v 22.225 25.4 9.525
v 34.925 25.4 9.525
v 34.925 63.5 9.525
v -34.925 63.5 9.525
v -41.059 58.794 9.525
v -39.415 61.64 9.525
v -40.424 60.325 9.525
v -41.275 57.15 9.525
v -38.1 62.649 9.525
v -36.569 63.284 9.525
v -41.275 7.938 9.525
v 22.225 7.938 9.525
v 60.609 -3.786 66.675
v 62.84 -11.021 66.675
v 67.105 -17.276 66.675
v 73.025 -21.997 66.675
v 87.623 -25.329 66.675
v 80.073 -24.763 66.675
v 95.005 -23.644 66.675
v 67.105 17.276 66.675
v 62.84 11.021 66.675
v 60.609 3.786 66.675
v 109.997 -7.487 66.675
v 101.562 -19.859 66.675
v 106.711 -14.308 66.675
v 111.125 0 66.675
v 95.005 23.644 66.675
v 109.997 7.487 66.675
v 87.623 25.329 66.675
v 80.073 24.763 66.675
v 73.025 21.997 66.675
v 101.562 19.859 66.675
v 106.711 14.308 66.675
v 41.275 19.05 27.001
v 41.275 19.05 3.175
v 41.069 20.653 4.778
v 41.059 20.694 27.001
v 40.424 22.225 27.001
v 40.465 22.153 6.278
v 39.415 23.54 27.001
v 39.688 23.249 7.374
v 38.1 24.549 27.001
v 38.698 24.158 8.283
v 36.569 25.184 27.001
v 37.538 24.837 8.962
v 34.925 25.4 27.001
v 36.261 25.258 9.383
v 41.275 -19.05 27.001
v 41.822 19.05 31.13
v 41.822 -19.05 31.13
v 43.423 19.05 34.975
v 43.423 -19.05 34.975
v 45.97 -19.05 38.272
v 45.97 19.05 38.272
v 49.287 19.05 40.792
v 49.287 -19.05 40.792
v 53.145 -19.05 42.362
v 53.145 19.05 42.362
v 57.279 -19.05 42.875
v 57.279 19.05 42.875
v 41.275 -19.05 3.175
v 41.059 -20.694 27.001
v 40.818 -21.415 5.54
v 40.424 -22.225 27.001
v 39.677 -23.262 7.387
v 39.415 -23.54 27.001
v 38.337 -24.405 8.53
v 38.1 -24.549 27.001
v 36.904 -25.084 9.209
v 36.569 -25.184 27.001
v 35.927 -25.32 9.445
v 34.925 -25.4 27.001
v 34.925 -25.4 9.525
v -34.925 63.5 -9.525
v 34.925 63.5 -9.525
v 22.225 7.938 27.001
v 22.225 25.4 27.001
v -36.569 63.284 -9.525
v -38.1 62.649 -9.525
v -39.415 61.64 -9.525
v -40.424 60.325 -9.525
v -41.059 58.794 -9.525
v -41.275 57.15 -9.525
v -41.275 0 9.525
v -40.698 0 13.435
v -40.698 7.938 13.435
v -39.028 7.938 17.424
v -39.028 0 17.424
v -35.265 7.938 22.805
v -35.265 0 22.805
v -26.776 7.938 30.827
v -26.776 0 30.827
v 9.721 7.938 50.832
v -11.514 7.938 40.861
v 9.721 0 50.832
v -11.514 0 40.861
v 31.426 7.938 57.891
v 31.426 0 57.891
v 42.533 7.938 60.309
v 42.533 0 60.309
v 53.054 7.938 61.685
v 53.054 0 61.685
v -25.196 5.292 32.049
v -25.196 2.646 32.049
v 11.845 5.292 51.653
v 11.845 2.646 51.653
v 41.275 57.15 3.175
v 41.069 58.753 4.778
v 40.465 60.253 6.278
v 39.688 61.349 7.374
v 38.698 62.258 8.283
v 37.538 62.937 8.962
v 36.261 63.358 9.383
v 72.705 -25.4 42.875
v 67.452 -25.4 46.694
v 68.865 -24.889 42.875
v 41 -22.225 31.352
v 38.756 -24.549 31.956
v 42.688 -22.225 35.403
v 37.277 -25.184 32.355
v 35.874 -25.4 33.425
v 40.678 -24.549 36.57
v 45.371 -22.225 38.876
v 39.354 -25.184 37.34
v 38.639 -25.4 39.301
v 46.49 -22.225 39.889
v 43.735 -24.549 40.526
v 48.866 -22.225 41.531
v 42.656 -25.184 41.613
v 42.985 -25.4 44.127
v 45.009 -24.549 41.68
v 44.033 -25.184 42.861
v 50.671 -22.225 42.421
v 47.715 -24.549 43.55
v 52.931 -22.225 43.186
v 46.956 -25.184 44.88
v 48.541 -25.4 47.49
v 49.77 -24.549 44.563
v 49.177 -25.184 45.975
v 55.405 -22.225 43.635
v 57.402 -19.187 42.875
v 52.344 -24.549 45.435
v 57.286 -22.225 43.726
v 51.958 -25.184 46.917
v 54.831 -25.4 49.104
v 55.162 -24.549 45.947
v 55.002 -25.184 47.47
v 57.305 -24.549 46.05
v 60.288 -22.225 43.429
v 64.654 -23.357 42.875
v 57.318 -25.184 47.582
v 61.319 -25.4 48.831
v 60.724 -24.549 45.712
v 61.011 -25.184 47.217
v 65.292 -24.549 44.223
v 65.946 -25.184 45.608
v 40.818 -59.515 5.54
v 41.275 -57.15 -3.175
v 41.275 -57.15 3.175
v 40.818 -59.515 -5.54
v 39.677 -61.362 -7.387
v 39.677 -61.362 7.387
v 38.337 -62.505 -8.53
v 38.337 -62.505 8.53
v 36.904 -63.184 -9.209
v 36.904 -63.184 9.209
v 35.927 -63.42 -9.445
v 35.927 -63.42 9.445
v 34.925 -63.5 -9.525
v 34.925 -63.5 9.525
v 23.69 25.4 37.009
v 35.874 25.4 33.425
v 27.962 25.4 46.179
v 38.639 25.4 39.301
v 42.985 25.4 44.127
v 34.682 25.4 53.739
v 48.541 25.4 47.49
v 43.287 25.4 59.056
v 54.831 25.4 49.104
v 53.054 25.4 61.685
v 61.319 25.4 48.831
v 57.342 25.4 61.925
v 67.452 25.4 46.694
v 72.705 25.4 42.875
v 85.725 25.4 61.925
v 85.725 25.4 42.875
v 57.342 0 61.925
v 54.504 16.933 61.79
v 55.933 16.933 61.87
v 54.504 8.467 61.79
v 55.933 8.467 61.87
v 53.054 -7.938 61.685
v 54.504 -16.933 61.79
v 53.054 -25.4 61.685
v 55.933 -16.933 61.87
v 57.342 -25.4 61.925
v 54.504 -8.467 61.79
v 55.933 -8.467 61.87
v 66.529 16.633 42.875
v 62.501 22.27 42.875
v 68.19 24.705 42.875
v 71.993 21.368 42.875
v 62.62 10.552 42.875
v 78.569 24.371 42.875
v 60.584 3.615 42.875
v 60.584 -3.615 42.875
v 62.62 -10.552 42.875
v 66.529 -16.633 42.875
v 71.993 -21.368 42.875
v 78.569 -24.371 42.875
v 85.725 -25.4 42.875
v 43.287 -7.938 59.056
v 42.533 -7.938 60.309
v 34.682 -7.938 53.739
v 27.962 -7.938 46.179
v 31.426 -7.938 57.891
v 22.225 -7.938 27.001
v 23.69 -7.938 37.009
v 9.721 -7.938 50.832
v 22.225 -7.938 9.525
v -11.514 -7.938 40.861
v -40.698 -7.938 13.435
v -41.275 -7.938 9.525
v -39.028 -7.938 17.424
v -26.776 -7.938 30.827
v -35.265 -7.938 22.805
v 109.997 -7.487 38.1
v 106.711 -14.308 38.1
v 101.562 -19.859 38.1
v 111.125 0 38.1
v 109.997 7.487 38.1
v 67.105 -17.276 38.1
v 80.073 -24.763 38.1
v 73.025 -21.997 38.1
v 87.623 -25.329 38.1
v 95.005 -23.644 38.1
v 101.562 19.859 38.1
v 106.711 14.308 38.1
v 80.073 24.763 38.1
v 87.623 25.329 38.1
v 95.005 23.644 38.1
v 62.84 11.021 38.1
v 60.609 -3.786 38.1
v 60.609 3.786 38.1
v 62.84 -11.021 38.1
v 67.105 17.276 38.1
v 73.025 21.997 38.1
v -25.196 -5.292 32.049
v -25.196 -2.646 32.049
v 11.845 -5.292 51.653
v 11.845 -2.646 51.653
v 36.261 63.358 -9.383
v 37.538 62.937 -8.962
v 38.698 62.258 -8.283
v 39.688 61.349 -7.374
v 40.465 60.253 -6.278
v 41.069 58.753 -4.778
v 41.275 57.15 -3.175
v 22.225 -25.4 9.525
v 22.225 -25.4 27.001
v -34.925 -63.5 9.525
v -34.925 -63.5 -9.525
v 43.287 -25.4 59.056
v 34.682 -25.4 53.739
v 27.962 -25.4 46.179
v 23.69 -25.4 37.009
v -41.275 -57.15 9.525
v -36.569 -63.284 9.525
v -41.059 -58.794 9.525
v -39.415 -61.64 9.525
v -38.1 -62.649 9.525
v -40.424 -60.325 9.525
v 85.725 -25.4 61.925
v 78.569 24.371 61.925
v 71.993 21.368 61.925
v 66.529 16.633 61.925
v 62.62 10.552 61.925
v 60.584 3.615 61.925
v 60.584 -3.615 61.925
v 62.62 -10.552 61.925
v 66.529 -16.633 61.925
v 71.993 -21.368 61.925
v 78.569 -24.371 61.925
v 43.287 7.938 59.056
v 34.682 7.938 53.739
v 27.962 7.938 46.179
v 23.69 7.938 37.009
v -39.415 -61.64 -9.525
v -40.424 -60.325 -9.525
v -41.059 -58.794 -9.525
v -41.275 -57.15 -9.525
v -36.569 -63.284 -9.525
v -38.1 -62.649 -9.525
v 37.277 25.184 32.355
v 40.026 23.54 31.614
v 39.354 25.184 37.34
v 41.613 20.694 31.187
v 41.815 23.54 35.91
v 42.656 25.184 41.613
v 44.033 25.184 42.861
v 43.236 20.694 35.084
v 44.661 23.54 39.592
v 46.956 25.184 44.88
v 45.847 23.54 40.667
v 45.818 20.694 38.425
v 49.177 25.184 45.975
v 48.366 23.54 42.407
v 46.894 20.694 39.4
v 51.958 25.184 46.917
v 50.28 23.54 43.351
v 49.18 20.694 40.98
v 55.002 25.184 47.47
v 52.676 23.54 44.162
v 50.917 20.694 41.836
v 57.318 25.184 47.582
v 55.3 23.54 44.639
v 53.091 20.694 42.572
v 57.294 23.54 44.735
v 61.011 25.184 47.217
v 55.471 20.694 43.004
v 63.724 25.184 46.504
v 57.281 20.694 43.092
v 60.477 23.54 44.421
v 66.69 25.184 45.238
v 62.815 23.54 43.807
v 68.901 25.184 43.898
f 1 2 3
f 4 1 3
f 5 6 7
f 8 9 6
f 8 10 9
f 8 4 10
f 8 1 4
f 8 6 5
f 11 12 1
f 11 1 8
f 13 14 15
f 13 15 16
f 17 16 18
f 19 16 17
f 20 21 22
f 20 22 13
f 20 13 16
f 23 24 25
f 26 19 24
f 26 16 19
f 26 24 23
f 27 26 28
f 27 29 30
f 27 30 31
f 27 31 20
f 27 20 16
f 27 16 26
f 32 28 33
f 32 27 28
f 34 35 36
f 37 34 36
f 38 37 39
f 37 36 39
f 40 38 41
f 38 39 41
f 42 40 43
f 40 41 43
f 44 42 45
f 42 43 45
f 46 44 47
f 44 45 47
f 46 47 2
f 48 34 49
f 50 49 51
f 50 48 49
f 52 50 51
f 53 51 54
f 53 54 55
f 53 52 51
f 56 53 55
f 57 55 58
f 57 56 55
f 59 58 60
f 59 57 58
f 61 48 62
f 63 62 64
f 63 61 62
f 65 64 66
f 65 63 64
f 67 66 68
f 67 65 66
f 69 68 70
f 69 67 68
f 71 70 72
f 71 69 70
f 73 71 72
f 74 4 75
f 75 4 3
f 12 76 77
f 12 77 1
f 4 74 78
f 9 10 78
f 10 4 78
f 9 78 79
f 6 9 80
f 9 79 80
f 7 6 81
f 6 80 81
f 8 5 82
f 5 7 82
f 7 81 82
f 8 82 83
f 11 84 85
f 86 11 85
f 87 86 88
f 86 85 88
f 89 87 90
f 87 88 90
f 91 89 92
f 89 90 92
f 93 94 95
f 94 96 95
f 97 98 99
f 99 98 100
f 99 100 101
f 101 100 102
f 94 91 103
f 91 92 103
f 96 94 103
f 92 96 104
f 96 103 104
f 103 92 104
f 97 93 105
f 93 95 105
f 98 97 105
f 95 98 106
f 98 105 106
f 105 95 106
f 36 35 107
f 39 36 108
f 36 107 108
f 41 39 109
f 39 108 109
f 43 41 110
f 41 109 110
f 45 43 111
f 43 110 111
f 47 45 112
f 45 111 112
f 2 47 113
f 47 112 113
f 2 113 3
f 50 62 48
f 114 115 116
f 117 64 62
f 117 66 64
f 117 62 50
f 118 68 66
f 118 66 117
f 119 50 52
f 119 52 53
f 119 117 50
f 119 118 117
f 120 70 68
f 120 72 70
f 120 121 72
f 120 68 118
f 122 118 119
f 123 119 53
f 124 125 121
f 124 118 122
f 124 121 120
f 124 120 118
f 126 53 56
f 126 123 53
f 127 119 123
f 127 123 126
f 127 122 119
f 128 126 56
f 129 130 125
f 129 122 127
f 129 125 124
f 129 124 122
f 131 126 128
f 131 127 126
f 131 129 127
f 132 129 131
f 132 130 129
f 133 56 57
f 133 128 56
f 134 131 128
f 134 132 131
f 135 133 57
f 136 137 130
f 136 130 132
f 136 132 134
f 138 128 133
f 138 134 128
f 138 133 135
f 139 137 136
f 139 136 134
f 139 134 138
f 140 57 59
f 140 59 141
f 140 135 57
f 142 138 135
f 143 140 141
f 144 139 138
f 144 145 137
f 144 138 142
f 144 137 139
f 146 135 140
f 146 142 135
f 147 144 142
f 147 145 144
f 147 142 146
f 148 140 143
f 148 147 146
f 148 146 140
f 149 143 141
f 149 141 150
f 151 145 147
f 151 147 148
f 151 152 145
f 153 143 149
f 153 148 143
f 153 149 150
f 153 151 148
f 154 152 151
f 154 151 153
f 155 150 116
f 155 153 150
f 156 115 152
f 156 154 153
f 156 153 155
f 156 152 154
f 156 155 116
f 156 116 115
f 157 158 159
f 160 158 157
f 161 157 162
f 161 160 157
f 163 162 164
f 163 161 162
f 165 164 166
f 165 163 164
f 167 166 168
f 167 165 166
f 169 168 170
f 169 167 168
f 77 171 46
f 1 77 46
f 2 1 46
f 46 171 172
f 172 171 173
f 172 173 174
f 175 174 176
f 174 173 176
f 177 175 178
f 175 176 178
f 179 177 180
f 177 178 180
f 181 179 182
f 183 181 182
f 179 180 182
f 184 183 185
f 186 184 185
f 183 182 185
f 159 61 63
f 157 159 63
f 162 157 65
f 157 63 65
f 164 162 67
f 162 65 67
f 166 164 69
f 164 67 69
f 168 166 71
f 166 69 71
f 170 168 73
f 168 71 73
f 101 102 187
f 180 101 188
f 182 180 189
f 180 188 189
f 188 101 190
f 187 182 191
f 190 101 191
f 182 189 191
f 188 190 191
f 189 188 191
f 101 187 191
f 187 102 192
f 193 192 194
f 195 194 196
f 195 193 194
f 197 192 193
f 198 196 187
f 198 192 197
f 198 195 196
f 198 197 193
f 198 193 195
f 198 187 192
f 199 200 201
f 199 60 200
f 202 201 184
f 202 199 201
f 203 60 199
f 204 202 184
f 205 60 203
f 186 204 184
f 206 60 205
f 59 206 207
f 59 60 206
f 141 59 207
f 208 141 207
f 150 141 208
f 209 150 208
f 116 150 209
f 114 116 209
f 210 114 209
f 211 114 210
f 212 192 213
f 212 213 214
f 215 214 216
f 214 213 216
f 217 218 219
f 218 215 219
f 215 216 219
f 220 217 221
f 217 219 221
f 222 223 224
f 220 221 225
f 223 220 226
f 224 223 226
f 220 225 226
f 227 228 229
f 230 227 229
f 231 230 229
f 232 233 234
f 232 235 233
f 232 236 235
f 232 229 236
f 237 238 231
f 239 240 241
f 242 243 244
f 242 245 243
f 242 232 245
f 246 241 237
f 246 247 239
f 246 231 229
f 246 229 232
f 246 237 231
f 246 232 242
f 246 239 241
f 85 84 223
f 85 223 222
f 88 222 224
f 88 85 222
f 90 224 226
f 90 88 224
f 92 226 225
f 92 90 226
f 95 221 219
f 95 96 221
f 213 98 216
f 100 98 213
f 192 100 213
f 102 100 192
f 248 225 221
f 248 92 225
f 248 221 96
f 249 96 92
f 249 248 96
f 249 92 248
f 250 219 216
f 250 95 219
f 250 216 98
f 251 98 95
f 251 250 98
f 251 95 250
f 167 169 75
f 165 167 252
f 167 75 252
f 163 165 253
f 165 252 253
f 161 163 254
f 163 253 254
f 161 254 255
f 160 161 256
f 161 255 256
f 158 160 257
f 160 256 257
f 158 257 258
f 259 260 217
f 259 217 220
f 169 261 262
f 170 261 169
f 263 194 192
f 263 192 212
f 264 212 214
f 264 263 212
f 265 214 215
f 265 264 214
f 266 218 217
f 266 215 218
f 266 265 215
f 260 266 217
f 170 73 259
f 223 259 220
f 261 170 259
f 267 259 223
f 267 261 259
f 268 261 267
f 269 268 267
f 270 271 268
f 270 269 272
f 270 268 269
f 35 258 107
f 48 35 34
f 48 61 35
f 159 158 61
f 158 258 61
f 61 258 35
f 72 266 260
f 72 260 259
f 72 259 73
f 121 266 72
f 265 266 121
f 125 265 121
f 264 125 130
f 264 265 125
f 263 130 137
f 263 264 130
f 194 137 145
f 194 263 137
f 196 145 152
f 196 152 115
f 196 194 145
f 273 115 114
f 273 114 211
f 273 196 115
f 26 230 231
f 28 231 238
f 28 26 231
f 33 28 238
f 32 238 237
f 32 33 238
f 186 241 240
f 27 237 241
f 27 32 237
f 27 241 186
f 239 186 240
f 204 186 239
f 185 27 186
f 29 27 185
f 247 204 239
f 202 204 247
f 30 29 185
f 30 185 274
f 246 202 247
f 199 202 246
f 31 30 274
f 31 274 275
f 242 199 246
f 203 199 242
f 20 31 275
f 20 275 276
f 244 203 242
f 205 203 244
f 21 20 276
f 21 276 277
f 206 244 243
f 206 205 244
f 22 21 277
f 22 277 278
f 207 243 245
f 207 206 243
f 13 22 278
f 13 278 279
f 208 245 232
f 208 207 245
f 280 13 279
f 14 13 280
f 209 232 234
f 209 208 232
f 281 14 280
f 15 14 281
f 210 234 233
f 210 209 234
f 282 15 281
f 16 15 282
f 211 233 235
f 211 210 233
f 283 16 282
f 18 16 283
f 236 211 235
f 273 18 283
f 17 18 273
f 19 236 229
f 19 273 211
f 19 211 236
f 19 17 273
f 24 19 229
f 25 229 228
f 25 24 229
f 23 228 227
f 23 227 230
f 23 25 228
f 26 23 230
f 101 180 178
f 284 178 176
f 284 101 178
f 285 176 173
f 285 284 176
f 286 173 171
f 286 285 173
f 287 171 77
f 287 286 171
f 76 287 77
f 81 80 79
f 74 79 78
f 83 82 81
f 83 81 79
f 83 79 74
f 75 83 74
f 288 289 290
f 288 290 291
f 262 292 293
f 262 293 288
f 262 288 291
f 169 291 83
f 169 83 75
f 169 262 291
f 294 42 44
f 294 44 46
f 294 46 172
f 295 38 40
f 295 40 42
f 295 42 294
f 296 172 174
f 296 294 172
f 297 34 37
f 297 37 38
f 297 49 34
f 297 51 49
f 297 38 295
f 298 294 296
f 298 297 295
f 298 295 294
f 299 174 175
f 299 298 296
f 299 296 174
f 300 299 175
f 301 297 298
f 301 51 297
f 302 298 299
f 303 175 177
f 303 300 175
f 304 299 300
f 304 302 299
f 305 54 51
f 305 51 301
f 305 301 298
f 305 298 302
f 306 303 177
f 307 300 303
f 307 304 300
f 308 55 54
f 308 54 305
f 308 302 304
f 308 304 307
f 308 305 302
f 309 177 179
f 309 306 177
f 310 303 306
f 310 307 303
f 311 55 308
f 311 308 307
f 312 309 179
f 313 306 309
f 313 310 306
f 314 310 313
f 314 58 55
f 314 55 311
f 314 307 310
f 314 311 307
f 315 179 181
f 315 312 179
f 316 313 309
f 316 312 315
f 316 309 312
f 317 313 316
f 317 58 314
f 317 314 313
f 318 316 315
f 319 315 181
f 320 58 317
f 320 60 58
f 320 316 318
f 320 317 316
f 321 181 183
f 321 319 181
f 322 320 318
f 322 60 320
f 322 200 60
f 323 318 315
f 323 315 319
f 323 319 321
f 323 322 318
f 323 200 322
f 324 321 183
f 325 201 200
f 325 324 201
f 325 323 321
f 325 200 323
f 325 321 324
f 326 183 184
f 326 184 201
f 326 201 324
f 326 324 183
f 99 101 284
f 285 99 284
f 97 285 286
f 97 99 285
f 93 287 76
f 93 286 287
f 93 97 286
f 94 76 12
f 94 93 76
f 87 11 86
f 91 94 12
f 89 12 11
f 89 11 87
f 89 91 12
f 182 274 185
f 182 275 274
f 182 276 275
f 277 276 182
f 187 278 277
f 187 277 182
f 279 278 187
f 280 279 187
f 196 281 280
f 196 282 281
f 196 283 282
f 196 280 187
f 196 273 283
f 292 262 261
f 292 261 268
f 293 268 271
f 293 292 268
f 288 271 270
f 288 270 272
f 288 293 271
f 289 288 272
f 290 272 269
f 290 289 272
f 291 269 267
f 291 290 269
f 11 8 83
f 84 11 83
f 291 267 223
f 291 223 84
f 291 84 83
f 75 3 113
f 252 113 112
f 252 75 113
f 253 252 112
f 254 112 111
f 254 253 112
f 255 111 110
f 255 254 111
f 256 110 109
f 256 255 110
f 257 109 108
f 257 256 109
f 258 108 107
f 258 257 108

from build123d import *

# Parameters (mm, degrees)
F1_DEPTH     = 63.5
F0_W         = 25.4
F0_H         = 19.05
F2_DEPTH     = 25.4
F3_DEPTH     = 7.9375
F5_T1_DEPTH  = 50.8
F5_T3_DEPTH  = 158.75
F5_T5_DEPTH  = 53.975
F5_T7_DEPTH  = 17.4757259071
F5_T9_DEPTH  = 53.975
F5_T12_ANGLE = 147.7854112401
F5_T14_ANGLE = 147.7854112401
F5_T19_DEPTH = 53.975
F5_T23_DEPTH = 33.3507259071
F5_T30_DEPTH = 33.3507259071
F5_T34_DEPTH = 53.975


# Not quite as in the source:
# - a fillet or chamfer that OpenCascade refuses, or shapes differently, is made with other operations: its cross-section is extruded or revolved along the edge and cut away or added


with BuildPart() as f1:
    # F0 (on Front) → F1 (new body, symmetric)
    with BuildSketch(Plane.XZ):
        Polygon((-41.275, -9.525), (41.275, -9.525), (41.275, 9.525), (22.225, 9.525), (-41.275, 9.525), align=None)
    extrude(amount=F1_DEPTH, both=True)

    # F0 (on Front) → F2 (join, symmetric)
    with BuildSketch(Plane.XZ):
        with BuildLine():
            Line((22.225, 9.525), (41.275, 9.525))
            Line((41.275, 9.525), (41.275, 27.0007259071))
            ThreePointArc((41.275, 27.0007259071), (45.9704586348, 38.2716389076), (57.2792179355, 42.8752))
            Line((57.2792179355, 42.8752), (60.325, 42.8752))
            Line((60.325, 42.8752), (60.325, 61.9252))
            Line((60.325, 61.9252), (57.3416620374, 61.9252))
            add(Edge.make_bspline(
                [(53.0544398296, 61.6847569862), (54.513344238, 61.8019382233), (55.9438787453, 61.882664375), (57.3416620374, 61.9252)],
                knots=[107.5126961268, 107.5126961268, 107.5126961268, 107.5126961268, 111.6737524732, 111.6737524732, 111.6737524732, 111.6737524732], degree=3))
            ThreePointArc((53.0544398296, 61.6847569862), (31.0464268351, 50.2032924252), (22.225, 27.0007259071))
            Line((22.225, 27.0007259071), (22.225, 9.525))
        make_face()
        with Locations((73.025, 52.4002)):
            Rectangle(F0_W, F0_H)
    extrude(amount=F2_DEPTH, both=True)

    # F0 (on Front) → F3 (join, symmetric)
    with BuildSketch(Plane.XZ):
        with BuildLine():
            add(Edge.make_bspline(
                [(-41.275, 9.525), (-41.275, 31.2921475952), (15.3595053514, 58.6570472681), (53.0544398296, 61.6847569862)],
                knots=[0, 0, 0, 0, 107.5126961268, 107.5126961268, 107.5126961268, 107.5126961268], degree=3))
            Line((-41.275, 9.525), (22.225, 9.525))
            Line((22.225, 9.525), (22.225, 27.0007259071))
            ThreePointArc((22.225, 27.0007259071), (31.0464268351, 50.2032924252), (53.0544398296, 61.6847569862))
        make_face()
    extrude(amount=F3_DEPTH, both=True)

    # F0 (on Front) → F4 (revolve)
    with BuildSketch(Plane.XZ):
        Polygon((85.725, 61.9252), (85.725, 42.8752), (85.725, 38.1), (111.125, 38.1), (111.125, 66.675), (85.725, 66.675), align=None)
    revolve(axis=Axis((85.725, 0, 52.3875), (0, 0, 1)))

    # F5: fillet of radius 6.35 on 12 edges, made by hand

    # F5_s2 → F5_t1 (cut)
    with BuildSketch(Plane.XY.offset(-25.4)):
        with BuildLine():
            ThreePointArc((41.275, -57.15), (39.4151280605, -61.6401280605), (34.925, -63.5))
            Line((34.925, -63.5), (41.275, -63.5))
            Line((41.275, -63.5), (41.275, -57.15))
        make_face()
        with BuildLine():
            ThreePointArc((-34.925, -63.5), (-39.4151280605, -61.6401280605), (-41.275, -57.15))
            Line((-41.275, -57.15), (-41.275, -63.5))
            Line((-41.275, -63.5), (-34.925, -63.5))
        make_face()
        with BuildLine():
            ThreePointArc((34.925, 63.5), (39.4151280605, 61.6401280605), (41.275, 57.15))
            Line((41.275, 57.15), (41.275, 63.5))
            Line((41.275, 63.5), (34.925, 63.5))
        make_face()
        with BuildLine():
            ThreePointArc((-34.925, 63.5), (-39.4151280605, 61.6401280605), (-41.275, 57.15))
            Line((-41.275, 57.15), (-41.275, 63.5))
            Line((-41.275, 63.5), (-34.925, 63.5))
        make_face()
    extrude(amount=F5_T1_DEPTH, mode=Mode.SUBTRACT)

    # F5_s4 → F5_t3 (cut)
    with BuildSketch(Plane.XZ.offset(-79.375)):
        with BuildLine():
            ThreePointArc((34.925, -9.525), (39.4151280605, -7.6651280605), (41.275, -3.175))
            Line((41.275, -3.175), (41.275, -9.525))
            Line((41.275, -9.525), (34.925, -9.525))
        make_face()
    extrude(amount=F5_T3_DEPTH, mode=Mode.SUBTRACT)

    # F5_s6 → F5_t5 (cut)
    with BuildSketch(Plane.XZ.offset(-79.375)):
        with BuildLine():
            ThreePointArc((41.275, 3.175), (39.4151280605, 7.6651280605), (34.925, 9.525))
            Line((34.925, 9.525), (41.275, 9.525))
            Line((41.275, 9.525), (41.275, 3.175))
        make_face()
    extrude(amount=F5_T5_DEPTH, mode=Mode.SUBTRACT)

    # F5_s8 → F5_t7 (cut)
    with BuildSketch(Plane.XY.offset(9.525)):
        with BuildLine():
            ThreePointArc((41.275, 19.05), (39.4151280605, 23.5401280605), (34.925, 25.4))
            Line((34.925, 25.4), (41.275, 25.4))
            Line((41.275, 25.4), (41.275, 19.05))
        make_face()
        with BuildLine():
            ThreePointArc((41.275, -19.05), (39.4151280605, -23.5401280605), (34.925, -25.4))
            Line((34.925, -25.4), (41.275, -25.4))
            Line((41.275, -25.4), (41.275, -19.05))
        make_face()
    extrude(amount=F5_T7_DEPTH, mode=Mode.SUBTRACT)

    # F5_s10 → F5_t9 (cut)
    with BuildSketch(Plane.XZ.offset(25.4)):
        with BuildLine():
            ThreePointArc((41.275, 3.175), (39.4151280605, 7.6651280605), (34.925, 9.525))
            Line((34.925, 9.525), (41.275, 9.525))
            Line((41.275, 9.525), (41.275, 3.175))
        make_face()
    extrude(amount=F5_T9_DEPTH, mode=Mode.SUBTRACT)

    # F5_s11 → F5_t12 (revolve, cut)
    with BuildSketch(Plane.XY.offset(27.0007259071)):
        with BuildLine():
            ThreePointArc((34.925, 25.4), (39.4151280605, 23.5401280605), (41.275, 19.05))
            Line((41.275, 19.05), (41.275, 25.4))
            Line((41.275, 25.4), (34.925, 25.4))
        make_face()
    revolve(axis=Axis((57.15, 25.4, 27.0007259071), (0, 1, 0)), revolution_arc=F5_T12_ANGLE, mode=Mode.SUBTRACT)

    # F5_s13 → F5_t14 (revolve, cut)
    with BuildSketch(Plane.XY.offset(27.0007259071)):
        with BuildLine():
            ThreePointArc((41.275, -19.05), (39.4151280605, -23.5401280605), (34.925, -25.4))
            Line((34.925, -25.4), (41.275, -25.4))
            Line((41.275, -25.4), (41.275, -19.05))
        make_face()
    revolve(axis=Axis((57.15, -25.4, 27.0007259071), (0, 1, 0)), revolution_arc=F5_T14_ANGLE, mode=Mode.SUBTRACT)


with BuildPart() as f5_tool17:
    # F5_s18 → F5_t19 (new body)
    with BuildSketch(Plane.XZ.offset(-63.5)):
        with BuildLine():
            ThreePointArc((41.275, 3.175), (39.4151280605, 7.6651280605), (34.925, 9.525))
            Line((34.925, 9.525), (41.275, 9.525))
            Line((41.275, 9.525), (41.275, 3.175))
        make_face()
    extrude(amount=F5_T19_DEPTH)

    split(bisect_by=Plane.XZ.offset(-25.4), keep=Keep.TOP)


with BuildPart() as f5_tool21:
    # F5_s22 → F5_t23 (new body)
    with BuildSketch(Plane.XY.offset(-6.35)):
        with BuildLine():
            ThreePointArc((41.275, 19.05), (39.4151280605, 23.5401280605), (34.925, 25.4))
            Line((34.925, 25.4), (41.275, 25.4))
            Line((41.275, 25.4), (41.275, 19.05))
        make_face()
    extrude(amount=F5_T23_DEPTH)

    split(bisect_by=Plane.XY.offset(9.525), keep=Keep.BOTTOM)


with BuildPart() as f5_tool17_1:
    add(f5_tool17.part)

    # F5_t25: intersect F5_tool21
    add(f5_tool21.part, mode=Mode.INTERSECT)


with BuildPart() as f1_1:
    add(f1.part)

    # F5_t15: cut F5_tool17
    add(f5_tool17_1.part, mode=Mode.SUBTRACT)


with BuildPart() as f5_tool28:
    # F5_s29 → F5_t30 (new body)
    with BuildSketch(Plane.XY.offset(-6.35)):
        with BuildLine():
            ThreePointArc((41.275, -19.05), (39.4151280605, -23.5401280605), (34.925, -25.4))
            Line((34.925, -25.4), (41.275, -25.4))
            Line((41.275, -25.4), (41.275, -19.05))
        make_face()
    extrude(amount=F5_T30_DEPTH)

    split(bisect_by=Plane.XY.offset(9.525), keep=Keep.BOTTOM)


with BuildPart() as f5_tool32:
    # F5_s33 → F5_t34 (new body)
    with BuildSketch(Plane.XZ.offset(9.525)):
        with BuildLine():
            ThreePointArc((41.275, 3.175), (39.4151280605, 7.6651280605), (34.925, 9.525))
            Line((34.925, 9.525), (41.275, 9.525))
            Line((41.275, 9.525), (41.275, 3.175))
        make_face()
    extrude(amount=F5_T34_DEPTH)

    split(bisect_by=Plane.XZ.offset(25.4), keep=Keep.BOTTOM)


with BuildPart() as f5_tool28_1:
    add(f5_tool28.part)

    # F5_t36: intersect F5_tool32
    add(f5_tool32.part, mode=Mode.INTERSECT)


with BuildPart() as f1_2:
    add(f1_1.part)

    # F5_t26: cut F5_tool28
    add(f5_tool28_1.part, mode=Mode.SUBTRACT)


solid = f1_2.part
